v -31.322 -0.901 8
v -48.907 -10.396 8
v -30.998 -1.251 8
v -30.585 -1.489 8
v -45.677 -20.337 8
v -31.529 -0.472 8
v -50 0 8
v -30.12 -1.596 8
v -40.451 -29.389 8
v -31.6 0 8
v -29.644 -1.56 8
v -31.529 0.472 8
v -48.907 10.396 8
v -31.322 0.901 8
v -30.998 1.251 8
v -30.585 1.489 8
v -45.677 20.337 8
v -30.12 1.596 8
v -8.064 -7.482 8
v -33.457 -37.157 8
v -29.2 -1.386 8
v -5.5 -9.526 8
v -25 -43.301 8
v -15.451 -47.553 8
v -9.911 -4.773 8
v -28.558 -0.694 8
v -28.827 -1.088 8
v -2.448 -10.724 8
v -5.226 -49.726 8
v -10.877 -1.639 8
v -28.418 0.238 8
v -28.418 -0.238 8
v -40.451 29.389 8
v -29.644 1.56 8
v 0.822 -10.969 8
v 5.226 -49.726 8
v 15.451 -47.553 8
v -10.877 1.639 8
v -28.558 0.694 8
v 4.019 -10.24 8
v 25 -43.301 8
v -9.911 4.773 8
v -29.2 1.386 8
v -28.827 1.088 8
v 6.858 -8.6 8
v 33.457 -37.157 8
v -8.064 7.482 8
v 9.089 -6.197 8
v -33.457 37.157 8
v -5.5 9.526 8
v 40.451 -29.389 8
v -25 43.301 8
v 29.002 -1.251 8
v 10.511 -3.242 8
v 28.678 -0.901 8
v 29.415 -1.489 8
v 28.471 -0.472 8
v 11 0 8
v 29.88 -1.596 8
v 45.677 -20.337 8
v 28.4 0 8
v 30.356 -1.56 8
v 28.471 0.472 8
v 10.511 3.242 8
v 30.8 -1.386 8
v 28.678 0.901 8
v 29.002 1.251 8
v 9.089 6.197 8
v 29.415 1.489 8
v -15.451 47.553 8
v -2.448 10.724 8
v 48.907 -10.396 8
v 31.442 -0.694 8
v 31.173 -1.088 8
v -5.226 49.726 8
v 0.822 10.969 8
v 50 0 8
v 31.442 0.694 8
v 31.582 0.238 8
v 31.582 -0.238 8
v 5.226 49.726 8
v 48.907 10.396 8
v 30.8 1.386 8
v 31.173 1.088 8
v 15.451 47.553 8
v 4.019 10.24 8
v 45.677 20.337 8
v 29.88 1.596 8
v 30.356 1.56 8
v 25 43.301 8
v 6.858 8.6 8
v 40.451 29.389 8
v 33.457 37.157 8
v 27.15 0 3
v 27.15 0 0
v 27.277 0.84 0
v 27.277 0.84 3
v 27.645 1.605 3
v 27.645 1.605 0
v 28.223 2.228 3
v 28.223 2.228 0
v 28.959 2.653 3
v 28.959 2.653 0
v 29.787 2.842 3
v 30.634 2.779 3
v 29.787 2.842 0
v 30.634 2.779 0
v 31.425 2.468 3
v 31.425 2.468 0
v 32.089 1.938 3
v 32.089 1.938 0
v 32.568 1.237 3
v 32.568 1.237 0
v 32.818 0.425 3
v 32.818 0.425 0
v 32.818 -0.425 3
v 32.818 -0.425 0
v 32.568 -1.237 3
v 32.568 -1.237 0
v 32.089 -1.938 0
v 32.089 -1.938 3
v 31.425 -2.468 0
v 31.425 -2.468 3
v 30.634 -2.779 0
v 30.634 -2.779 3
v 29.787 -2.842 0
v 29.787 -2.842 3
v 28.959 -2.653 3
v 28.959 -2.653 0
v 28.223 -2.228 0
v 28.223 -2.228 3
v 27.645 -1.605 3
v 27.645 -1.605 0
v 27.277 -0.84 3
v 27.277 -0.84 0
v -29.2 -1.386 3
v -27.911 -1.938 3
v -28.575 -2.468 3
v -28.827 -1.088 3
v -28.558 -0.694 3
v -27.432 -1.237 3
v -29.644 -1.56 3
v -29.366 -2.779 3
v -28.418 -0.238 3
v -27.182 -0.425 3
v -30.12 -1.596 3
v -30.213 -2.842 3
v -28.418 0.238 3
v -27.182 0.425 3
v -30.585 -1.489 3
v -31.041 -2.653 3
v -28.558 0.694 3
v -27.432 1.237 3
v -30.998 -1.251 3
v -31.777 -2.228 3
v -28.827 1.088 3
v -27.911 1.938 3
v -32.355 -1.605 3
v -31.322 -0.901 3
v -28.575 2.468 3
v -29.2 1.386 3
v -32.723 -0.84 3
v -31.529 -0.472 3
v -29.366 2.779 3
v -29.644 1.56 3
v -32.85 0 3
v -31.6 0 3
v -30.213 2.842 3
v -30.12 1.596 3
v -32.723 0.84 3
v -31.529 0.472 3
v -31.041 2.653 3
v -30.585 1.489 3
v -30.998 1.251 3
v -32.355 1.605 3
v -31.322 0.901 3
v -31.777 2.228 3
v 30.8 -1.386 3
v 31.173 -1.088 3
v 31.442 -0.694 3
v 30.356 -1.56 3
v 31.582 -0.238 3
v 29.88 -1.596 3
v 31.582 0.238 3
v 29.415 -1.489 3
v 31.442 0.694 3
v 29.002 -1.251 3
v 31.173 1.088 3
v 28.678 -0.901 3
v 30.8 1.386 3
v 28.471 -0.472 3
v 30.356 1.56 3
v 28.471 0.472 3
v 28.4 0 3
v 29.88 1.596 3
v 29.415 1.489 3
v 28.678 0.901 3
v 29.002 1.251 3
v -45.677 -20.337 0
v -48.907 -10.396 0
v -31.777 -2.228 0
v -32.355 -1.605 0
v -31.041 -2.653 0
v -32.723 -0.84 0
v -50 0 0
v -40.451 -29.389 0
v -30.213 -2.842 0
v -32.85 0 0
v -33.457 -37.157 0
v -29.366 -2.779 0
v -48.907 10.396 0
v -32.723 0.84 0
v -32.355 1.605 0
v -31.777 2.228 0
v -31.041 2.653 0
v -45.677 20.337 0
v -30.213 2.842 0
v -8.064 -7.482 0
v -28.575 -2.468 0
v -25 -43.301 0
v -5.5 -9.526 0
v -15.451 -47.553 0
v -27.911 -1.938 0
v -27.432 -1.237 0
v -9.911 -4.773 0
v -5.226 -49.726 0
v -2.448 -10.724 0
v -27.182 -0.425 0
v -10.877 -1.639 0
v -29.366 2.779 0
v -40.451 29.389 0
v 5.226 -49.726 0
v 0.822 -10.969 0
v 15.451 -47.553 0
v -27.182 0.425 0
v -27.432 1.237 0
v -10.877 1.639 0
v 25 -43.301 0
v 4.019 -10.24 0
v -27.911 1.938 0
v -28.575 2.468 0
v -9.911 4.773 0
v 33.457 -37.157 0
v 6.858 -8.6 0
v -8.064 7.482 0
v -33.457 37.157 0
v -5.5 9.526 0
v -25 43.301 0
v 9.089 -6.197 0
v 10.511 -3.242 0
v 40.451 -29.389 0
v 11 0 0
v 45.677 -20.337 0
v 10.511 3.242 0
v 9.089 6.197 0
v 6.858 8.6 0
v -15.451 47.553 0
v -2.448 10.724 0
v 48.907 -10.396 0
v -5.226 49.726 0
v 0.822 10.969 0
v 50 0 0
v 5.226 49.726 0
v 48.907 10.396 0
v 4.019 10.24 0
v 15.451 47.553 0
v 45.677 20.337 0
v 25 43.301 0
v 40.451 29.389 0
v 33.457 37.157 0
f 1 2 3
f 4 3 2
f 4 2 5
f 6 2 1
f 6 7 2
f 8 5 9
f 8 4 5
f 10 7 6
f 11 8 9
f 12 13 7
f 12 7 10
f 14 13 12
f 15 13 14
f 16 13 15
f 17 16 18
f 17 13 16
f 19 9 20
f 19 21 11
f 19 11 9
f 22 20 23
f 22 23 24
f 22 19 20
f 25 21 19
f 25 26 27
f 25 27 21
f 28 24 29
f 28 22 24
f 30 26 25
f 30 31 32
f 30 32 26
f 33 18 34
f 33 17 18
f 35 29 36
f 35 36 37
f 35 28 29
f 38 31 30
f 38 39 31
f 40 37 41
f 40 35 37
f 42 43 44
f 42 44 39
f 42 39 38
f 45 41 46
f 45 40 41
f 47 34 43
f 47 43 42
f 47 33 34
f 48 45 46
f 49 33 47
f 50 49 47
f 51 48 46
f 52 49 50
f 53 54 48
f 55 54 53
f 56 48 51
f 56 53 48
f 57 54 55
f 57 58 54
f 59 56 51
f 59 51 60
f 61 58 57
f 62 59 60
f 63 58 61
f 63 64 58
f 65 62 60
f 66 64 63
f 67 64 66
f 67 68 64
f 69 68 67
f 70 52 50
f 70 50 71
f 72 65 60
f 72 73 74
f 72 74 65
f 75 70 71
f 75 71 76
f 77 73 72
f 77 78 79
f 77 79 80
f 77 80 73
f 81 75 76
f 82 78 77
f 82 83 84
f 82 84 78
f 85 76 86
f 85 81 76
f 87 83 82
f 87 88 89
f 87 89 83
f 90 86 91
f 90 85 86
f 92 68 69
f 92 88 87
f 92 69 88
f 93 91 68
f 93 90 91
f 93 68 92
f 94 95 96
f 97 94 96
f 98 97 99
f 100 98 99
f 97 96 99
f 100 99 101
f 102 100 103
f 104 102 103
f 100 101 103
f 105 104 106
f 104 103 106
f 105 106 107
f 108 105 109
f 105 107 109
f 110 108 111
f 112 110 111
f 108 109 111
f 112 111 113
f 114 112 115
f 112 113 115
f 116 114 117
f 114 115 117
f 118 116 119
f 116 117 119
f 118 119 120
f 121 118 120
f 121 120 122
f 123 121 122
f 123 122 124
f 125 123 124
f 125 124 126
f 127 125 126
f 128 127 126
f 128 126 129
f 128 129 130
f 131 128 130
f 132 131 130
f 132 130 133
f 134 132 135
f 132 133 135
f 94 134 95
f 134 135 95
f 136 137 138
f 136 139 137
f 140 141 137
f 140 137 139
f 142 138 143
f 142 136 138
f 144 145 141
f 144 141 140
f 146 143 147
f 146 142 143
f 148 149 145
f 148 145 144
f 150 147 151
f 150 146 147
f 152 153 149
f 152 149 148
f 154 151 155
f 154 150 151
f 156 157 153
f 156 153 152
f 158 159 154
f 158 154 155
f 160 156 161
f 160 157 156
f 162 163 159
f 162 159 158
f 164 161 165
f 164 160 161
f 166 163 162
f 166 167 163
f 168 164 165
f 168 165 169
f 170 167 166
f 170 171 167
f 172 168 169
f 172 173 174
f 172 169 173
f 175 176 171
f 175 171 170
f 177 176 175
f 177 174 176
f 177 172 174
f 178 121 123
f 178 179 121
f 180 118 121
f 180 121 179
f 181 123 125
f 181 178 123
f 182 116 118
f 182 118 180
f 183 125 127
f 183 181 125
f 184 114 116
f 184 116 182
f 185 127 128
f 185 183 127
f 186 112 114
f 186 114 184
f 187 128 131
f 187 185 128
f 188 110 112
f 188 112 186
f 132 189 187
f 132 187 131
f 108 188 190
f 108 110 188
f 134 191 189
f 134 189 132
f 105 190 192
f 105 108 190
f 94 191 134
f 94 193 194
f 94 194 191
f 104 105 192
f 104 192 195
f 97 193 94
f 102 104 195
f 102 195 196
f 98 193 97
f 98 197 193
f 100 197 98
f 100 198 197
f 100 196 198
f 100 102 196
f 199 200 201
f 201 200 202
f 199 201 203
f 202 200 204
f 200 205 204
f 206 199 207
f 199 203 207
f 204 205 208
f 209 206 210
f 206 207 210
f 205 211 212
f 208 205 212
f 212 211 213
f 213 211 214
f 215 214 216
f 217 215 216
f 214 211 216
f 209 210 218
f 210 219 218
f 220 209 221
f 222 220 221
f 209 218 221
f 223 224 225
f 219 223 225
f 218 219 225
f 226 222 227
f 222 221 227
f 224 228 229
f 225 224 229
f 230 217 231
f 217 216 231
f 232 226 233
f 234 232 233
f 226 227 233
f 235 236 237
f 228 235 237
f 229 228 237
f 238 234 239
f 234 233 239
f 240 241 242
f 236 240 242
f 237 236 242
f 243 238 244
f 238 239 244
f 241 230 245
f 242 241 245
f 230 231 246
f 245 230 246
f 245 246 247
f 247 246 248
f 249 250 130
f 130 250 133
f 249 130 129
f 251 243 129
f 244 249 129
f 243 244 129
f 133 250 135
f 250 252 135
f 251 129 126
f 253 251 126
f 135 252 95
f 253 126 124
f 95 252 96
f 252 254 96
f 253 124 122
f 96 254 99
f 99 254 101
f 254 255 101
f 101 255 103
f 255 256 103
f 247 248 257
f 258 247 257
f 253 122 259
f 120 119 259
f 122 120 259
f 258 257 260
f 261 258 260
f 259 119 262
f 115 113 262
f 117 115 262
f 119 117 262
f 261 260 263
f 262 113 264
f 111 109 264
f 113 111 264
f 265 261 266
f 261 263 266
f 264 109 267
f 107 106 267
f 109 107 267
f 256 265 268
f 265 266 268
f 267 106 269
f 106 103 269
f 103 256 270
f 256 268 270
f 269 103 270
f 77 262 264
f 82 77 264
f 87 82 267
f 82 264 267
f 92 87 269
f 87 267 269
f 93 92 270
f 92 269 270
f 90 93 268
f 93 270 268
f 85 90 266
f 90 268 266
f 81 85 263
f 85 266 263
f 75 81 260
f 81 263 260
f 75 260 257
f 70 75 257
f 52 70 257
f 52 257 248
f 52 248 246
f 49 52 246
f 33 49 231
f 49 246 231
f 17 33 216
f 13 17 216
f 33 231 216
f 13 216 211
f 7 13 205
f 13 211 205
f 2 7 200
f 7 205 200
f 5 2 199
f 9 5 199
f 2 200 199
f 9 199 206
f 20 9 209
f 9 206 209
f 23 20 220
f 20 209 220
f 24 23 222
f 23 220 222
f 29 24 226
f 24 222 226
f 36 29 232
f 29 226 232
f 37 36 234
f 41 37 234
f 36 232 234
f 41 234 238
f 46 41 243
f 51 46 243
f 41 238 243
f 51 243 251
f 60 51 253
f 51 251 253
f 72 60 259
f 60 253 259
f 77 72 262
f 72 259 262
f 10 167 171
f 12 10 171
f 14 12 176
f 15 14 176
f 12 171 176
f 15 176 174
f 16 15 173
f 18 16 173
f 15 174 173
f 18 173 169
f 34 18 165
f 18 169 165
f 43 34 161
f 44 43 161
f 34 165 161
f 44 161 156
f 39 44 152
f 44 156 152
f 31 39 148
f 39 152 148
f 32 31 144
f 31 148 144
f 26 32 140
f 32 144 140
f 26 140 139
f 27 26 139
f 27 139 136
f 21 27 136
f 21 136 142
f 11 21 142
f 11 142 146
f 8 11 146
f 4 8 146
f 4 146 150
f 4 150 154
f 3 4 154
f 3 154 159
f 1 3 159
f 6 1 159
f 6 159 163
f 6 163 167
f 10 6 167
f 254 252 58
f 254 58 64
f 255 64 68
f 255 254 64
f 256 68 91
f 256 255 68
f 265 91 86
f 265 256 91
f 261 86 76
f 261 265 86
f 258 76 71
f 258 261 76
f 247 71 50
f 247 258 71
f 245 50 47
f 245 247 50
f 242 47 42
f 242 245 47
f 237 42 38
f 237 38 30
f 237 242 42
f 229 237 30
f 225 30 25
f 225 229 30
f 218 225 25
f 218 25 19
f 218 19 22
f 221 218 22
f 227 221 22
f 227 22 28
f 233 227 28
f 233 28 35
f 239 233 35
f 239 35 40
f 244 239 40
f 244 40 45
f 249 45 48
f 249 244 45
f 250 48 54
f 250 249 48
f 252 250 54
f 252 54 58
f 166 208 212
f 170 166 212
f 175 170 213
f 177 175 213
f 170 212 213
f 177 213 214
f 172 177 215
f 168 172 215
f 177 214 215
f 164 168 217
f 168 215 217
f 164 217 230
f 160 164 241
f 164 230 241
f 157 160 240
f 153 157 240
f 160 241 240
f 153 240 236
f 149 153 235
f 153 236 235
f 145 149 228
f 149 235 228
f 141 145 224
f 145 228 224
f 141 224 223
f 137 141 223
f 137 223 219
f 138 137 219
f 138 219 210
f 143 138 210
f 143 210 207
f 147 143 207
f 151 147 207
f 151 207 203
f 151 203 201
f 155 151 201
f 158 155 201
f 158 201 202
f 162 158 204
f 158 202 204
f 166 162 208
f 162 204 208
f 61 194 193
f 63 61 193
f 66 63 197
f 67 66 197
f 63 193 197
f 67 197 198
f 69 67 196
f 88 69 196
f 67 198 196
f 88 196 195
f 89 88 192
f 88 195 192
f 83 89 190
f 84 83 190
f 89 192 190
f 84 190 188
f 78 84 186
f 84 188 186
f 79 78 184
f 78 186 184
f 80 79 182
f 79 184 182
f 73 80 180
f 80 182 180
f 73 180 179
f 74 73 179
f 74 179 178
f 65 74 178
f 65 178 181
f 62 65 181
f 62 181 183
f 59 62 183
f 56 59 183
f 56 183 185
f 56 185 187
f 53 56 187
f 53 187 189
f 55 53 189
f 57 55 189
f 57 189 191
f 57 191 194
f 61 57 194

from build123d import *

# Parameters (mm, degrees)
ESQUISSE1_R             = 50
ESQUISSE1_R_2           = 11
BOSS_EXTRU_1_DEPTH      = 8
ESQUISSE2_R             = 1.6
ENL_V_MAT_EXTRU_1_DEPTH = 72.161787499
ESQUISSE3_R             = 2.85
ENL_V_MAT_EXTRU_2_DEPTH = 3


with BuildPart() as part:
    # Esquisse1 → Boss.-Extru.1 (new body)
    with BuildSketch(Plane.XY):
        Circle(ESQUISSE1_R)
        Circle(ESQUISSE1_R_2, mode=Mode.SUBTRACT)
    extrude(amount=BOSS_EXTRU_1_DEPTH)

    # Esquisse2 → Enlèv. mat.-Extru.1 (cut, through all)
    with BuildSketch(Plane(origin=(0, 0, 0), x_dir=(-1, 0, 0), z_dir=(0, 0, -1))):
        with Locations((30, 0)):
            Circle(ESQUISSE2_R)
        with Locations((-30, 0)):
            Circle(ESQUISSE2_R)
    extrude(amount=-ENL_V_MAT_EXTRU_1_DEPTH, mode=Mode.SUBTRACT)

    # Esquisse3 → Enlèv. mat.-Extru.2 (cut)
    with BuildSketch(Plane(origin=(0, 0, 0), x_dir=(-1, 0, 0), z_dir=(0, 0, -1))):
        with Locations((30, 0)):
            Circle(ESQUISSE3_R)
        with Locations((-30, 0)):
            Circle(ESQUISSE3_R)
    extrude(amount=-ENL_V_MAT_EXTRU_2_DEPTH, mode=Mode.SUBTRACT)


solid = part.part
